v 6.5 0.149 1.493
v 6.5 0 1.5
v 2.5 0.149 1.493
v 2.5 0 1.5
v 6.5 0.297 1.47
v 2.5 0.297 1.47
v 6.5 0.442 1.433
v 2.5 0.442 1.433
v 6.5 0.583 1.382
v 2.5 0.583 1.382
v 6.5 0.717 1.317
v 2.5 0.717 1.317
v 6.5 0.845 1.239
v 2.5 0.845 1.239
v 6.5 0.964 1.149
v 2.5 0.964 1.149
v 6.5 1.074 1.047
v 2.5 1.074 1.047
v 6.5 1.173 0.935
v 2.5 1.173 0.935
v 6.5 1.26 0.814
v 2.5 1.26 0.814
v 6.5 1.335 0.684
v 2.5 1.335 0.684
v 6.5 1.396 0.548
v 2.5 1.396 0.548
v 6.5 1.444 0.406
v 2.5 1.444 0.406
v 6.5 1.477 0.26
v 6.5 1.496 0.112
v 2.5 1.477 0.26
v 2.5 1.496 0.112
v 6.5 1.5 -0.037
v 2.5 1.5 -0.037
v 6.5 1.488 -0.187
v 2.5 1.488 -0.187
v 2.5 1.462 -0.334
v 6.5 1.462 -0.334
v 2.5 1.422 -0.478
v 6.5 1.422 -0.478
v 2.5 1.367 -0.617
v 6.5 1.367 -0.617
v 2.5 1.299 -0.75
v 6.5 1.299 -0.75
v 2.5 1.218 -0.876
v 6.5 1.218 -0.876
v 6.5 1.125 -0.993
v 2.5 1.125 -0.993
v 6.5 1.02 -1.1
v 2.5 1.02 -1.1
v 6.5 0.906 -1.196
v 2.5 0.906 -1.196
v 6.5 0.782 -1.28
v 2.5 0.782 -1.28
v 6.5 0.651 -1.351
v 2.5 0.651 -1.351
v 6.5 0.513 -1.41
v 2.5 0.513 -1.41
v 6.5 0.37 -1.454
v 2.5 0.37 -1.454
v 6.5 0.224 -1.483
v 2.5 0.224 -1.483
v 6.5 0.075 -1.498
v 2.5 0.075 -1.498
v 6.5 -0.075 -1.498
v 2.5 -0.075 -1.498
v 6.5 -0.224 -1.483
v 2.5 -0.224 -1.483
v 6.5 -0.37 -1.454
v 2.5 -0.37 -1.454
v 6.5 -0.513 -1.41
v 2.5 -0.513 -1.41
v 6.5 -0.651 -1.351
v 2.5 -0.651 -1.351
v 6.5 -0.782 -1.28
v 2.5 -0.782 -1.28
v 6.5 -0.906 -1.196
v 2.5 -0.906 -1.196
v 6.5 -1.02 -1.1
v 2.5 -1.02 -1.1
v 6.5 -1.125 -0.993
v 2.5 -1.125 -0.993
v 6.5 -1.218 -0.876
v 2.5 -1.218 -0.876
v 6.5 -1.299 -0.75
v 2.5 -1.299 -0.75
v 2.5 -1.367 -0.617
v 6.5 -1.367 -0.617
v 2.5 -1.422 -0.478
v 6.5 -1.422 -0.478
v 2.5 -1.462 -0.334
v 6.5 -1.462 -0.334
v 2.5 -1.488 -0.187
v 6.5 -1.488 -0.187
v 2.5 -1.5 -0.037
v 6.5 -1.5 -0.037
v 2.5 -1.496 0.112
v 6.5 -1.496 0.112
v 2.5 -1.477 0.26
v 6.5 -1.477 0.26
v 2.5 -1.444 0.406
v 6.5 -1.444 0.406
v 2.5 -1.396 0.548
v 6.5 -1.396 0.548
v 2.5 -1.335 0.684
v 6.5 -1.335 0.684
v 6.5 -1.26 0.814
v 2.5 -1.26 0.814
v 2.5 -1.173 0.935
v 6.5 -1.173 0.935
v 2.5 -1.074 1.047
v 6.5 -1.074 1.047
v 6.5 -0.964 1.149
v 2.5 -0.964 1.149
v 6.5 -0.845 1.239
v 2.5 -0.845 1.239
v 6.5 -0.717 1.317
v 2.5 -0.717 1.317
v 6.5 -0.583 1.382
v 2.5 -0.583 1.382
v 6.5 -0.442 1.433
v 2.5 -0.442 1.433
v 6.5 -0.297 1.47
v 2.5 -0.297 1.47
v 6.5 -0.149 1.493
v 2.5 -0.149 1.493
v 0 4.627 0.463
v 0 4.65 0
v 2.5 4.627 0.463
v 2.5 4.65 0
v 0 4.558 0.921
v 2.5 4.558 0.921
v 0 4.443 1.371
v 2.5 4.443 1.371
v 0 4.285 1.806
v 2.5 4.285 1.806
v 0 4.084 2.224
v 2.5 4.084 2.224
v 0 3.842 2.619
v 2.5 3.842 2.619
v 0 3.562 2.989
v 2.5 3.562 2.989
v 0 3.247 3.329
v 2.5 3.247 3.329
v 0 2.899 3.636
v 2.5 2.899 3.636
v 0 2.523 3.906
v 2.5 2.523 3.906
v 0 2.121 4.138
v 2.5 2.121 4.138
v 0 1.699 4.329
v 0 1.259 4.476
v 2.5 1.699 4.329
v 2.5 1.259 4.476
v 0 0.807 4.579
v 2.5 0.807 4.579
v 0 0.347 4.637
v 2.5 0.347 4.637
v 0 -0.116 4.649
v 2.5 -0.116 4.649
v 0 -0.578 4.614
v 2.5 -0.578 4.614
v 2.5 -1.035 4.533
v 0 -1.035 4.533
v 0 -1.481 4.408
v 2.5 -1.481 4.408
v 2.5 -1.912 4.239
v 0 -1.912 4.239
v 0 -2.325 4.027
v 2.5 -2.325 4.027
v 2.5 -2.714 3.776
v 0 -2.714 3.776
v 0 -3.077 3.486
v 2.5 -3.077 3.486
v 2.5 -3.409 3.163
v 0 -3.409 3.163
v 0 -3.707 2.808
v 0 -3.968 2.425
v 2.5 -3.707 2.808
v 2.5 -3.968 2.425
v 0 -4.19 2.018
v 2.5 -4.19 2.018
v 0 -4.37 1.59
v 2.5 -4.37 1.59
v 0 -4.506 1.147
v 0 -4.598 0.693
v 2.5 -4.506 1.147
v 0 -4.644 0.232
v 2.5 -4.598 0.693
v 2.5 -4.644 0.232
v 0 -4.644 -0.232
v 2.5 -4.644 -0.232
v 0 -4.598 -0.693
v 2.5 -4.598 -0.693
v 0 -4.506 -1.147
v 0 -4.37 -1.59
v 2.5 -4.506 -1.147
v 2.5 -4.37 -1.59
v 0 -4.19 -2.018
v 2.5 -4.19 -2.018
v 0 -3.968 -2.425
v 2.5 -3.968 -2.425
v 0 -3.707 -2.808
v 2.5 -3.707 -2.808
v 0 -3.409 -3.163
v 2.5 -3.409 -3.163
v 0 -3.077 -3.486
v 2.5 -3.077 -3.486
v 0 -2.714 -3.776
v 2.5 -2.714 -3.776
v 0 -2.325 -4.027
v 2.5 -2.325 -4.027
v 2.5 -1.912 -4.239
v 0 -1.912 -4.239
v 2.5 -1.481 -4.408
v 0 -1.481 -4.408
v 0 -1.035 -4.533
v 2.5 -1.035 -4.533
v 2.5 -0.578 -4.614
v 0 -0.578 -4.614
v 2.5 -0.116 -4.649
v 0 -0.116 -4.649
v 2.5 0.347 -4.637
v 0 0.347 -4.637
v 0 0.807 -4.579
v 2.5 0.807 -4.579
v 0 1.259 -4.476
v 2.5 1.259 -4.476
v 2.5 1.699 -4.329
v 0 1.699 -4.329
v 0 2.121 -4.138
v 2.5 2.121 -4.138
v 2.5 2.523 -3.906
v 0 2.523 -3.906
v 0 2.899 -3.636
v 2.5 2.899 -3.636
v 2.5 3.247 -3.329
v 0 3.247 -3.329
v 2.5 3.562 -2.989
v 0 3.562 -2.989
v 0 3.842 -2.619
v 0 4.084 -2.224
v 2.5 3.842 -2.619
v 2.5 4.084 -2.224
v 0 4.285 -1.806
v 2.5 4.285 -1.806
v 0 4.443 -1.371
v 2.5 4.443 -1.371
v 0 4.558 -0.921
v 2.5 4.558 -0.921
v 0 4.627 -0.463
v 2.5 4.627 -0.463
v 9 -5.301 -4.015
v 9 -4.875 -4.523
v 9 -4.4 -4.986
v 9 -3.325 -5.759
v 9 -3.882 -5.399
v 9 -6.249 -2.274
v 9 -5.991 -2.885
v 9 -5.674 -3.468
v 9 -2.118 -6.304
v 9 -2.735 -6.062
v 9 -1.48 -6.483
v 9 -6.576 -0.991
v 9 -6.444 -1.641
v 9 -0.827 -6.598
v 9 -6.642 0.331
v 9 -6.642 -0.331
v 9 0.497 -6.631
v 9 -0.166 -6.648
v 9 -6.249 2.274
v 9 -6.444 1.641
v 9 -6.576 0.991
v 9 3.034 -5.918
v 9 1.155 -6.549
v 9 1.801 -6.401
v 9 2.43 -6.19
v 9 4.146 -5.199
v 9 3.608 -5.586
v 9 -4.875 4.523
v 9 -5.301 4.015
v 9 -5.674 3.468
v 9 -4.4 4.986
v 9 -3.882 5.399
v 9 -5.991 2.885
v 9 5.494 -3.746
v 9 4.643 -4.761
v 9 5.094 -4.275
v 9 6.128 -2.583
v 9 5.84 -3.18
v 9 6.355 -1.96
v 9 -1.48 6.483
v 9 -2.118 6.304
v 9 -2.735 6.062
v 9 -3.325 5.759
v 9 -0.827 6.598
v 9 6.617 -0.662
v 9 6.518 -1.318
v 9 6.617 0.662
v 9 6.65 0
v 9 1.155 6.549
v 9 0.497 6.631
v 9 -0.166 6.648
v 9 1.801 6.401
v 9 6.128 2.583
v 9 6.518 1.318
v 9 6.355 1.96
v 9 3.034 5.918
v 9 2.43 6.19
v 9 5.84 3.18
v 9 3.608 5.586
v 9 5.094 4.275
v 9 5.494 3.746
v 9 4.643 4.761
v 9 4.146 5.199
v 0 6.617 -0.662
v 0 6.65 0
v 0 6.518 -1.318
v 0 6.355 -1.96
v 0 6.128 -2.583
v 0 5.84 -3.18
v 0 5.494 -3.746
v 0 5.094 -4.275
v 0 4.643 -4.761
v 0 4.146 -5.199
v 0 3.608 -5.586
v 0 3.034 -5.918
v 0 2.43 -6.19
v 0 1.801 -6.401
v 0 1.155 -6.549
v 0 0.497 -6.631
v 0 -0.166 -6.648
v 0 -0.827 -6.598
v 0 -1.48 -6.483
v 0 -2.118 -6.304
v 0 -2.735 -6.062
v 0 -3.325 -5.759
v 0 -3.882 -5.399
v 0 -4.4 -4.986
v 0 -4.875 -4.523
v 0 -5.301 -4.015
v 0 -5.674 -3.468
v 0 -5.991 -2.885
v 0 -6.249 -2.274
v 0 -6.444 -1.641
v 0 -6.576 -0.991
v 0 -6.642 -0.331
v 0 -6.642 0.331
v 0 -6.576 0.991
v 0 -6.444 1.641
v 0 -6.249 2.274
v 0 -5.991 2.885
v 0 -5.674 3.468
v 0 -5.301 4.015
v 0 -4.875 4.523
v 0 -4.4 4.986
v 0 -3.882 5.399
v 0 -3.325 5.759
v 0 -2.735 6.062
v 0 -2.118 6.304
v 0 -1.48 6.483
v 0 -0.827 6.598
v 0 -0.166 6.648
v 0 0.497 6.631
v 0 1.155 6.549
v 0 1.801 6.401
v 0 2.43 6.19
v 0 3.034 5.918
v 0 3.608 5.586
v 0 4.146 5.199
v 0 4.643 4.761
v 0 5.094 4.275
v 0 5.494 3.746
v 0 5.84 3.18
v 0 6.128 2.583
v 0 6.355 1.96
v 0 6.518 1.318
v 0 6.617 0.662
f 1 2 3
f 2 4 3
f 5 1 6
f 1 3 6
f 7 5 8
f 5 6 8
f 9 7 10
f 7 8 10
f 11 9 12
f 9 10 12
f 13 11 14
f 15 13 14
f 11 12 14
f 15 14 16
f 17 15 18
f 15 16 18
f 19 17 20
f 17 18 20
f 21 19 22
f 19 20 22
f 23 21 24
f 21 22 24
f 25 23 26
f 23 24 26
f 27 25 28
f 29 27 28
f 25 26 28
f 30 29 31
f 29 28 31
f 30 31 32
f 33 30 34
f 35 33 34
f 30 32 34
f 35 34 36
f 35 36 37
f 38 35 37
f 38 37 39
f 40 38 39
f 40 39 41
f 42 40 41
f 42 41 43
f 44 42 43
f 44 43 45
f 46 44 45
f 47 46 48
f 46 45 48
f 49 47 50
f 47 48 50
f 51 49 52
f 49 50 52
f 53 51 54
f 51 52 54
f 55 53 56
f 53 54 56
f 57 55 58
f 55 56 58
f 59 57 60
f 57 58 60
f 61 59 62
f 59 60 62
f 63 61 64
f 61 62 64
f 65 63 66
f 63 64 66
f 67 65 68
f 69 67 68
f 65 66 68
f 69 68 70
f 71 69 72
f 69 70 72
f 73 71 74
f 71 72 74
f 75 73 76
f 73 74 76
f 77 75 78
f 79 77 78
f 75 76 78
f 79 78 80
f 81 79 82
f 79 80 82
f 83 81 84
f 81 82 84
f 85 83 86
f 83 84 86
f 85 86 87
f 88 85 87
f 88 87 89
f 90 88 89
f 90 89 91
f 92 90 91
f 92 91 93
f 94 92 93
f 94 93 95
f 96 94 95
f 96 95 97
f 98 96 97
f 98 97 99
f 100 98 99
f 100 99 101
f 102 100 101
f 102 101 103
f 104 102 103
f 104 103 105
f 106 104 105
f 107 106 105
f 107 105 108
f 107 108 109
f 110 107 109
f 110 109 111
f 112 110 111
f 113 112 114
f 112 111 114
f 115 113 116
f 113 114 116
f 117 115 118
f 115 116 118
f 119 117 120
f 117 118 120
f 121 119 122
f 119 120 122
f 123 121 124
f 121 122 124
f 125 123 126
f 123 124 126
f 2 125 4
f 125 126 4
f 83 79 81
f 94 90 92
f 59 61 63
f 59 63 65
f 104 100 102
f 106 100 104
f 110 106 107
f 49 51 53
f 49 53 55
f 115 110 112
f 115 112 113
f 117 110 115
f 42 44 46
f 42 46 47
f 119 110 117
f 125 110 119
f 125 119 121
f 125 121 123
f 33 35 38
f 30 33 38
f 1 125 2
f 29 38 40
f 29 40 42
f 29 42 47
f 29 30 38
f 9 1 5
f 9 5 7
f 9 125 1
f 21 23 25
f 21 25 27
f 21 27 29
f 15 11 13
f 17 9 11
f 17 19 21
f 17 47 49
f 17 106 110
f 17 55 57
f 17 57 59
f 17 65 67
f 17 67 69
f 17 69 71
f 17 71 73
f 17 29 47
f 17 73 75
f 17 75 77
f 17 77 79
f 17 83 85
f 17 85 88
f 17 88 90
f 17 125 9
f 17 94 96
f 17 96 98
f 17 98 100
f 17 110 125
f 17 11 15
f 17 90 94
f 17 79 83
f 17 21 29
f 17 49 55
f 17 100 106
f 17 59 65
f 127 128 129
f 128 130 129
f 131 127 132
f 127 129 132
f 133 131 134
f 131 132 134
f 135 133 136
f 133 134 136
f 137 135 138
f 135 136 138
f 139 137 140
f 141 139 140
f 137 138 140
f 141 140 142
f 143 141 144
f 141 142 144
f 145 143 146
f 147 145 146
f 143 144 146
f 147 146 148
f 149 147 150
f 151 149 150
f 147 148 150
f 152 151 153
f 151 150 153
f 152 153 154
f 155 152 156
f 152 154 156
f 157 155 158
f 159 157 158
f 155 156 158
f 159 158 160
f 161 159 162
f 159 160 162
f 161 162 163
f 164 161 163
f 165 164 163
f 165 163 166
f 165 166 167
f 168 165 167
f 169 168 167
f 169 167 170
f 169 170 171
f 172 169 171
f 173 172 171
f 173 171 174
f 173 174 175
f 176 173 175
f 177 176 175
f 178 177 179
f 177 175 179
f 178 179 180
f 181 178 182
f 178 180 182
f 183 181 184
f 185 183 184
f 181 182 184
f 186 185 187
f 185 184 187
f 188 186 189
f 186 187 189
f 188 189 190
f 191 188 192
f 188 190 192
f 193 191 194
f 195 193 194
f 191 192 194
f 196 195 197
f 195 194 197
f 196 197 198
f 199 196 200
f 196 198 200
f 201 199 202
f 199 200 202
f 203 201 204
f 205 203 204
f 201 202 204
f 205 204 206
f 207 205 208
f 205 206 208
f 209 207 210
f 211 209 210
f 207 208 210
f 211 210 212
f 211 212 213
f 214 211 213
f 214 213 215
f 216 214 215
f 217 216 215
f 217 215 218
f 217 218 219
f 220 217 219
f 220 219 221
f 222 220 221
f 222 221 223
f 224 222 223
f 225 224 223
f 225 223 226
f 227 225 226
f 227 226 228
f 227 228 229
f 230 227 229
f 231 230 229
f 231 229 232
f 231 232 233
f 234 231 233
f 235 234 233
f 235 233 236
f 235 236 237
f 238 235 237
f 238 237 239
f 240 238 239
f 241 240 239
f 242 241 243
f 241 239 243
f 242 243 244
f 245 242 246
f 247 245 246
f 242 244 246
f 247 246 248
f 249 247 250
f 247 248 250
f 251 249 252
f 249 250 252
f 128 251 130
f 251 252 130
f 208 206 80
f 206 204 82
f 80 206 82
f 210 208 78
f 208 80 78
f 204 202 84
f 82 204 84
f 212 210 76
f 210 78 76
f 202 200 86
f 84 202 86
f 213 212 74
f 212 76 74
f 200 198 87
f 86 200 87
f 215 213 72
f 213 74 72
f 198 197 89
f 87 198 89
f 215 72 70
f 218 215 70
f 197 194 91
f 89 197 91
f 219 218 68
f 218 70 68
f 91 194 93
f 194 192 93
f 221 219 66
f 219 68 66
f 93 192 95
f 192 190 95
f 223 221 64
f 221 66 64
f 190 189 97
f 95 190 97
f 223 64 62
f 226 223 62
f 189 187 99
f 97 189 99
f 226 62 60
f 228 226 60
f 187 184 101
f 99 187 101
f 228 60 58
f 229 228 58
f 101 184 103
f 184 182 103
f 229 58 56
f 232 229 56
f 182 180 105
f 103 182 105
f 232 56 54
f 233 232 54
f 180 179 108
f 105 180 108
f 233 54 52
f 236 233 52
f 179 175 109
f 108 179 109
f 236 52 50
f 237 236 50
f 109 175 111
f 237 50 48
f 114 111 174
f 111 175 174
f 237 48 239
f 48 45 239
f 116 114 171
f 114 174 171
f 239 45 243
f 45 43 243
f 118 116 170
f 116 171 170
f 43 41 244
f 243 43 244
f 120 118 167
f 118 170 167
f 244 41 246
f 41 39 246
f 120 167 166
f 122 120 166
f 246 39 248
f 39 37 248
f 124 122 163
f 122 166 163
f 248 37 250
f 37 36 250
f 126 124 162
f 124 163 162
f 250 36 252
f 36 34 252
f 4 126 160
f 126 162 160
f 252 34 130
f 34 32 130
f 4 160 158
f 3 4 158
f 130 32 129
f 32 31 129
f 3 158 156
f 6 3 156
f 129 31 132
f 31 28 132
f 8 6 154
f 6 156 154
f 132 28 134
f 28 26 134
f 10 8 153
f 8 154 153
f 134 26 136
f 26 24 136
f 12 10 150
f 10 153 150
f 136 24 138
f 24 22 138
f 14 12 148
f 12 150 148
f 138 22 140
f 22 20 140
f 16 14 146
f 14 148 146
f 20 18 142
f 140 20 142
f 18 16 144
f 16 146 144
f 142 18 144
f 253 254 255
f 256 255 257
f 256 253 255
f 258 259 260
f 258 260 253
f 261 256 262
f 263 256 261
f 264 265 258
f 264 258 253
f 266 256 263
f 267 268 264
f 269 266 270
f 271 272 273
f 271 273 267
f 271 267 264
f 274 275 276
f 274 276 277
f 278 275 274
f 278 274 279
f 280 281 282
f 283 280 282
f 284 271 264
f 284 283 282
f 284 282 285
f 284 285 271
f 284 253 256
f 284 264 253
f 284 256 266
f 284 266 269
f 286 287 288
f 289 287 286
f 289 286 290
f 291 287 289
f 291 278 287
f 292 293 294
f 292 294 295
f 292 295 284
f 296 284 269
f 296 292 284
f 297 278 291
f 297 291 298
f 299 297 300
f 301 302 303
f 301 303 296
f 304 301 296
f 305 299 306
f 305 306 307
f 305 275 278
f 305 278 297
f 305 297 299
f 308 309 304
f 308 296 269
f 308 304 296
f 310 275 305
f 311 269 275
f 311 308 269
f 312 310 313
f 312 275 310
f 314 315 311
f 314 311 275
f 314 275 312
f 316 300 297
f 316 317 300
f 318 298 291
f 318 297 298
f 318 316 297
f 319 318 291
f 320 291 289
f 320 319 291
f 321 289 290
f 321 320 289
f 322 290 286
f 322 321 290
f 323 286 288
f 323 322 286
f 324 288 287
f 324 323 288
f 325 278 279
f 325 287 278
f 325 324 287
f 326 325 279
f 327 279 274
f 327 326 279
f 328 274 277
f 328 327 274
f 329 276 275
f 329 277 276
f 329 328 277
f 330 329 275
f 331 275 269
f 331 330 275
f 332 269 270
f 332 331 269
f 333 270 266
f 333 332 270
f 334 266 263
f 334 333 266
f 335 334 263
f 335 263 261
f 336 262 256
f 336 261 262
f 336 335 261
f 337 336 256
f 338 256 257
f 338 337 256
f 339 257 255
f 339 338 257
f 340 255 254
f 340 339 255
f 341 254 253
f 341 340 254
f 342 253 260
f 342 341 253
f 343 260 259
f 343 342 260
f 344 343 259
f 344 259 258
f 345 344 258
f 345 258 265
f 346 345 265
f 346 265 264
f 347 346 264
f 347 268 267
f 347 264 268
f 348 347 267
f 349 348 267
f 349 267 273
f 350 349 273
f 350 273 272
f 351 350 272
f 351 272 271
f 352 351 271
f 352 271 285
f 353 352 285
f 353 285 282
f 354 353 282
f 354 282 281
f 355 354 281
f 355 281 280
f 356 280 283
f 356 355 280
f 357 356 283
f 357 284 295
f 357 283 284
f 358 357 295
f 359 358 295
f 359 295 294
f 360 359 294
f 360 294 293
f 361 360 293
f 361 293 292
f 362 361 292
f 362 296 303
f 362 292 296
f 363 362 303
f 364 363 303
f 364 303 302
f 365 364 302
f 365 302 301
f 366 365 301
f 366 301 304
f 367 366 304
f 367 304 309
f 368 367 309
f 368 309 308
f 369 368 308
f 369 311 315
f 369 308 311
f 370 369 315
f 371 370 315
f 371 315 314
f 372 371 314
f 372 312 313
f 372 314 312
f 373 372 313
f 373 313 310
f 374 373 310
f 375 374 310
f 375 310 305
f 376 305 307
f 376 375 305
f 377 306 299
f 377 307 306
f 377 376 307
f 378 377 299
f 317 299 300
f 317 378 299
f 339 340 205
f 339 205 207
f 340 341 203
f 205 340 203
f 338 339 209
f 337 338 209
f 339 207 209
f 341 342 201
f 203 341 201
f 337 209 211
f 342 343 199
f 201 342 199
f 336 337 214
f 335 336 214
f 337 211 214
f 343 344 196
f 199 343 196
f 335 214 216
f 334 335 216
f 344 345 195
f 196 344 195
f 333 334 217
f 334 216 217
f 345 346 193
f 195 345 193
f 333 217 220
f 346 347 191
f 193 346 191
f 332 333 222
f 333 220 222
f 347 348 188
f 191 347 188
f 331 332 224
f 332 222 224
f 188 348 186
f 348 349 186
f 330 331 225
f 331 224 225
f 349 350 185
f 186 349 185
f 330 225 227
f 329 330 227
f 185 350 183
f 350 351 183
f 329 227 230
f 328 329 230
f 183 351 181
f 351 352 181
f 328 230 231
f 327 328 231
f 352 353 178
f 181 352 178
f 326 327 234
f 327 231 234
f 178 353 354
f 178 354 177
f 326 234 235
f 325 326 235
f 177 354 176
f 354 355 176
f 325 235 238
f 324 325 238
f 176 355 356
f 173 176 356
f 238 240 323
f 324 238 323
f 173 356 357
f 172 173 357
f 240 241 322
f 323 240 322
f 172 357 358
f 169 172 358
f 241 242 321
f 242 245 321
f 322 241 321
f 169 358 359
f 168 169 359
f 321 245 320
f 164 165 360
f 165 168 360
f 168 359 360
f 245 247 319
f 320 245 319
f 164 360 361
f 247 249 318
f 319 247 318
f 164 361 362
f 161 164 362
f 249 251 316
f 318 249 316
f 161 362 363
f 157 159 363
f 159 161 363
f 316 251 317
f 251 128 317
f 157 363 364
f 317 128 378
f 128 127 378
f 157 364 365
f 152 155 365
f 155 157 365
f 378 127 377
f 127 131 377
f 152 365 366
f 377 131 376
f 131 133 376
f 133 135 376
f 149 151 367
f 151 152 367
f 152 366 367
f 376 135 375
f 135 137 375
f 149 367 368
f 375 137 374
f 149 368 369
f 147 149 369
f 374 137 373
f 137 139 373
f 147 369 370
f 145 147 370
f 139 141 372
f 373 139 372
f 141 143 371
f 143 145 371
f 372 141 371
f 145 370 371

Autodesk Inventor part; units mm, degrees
ref_plane "YZ Plane" through (0, 0, 0) normal (1, 0, 0) x (0, 1, 0)
ref_plane "XZ Plane" through (0, 0, 0) normal (0, 1, 0) x (-1, 0, 0)
ref_plane "XY Plane" through (0, 0, 0) normal (0, 0, 1) x (1, 0, 0)
sketch "Esboço1" plane through (0, 0, 0) normal (0, 0, 1) x (1, 0, 0)
  line L0 (0, 0) -> (9, 0)
  line L1 (9, 0) -> (9, 6.65)
  line L2 (9, 6.65) -> (0, 6.65)
  line L3 (0, 6.65) -> (0, 4.65)
  line L4 (0, 4.65) -> (2.5, 4.65)
  line L5 (2.5, 4.65) -> (2.5, 0)
  dimension "d0" = 9
  dimension "d1" = 6.65
  dimension "d2" = 2
  dimension "d3" = 2.5
revolve "Revolução1" add sketch "Esboço1" angle 360 about axis through (0, 0, 0) along (1, 0, 0)
sketch "Esboço2" plane through (9, 0, 0) normal (1, 0, 0) x (0, 0, -1)
  circle A0 centre (0, 0) radius 2
  dimension "d5" = 4
extrude "Extrusão1" add sketch "Esboço2" along normal blind 1.5
sketch "Esboço3" plane through (2.5, 0, 0) normal (-1, 0, 0) x (0, 0, 1)
  circle A0 centre (0, 0) radius 1.5
  dimension "d8" = 3
extrude "Extrusão2" cut sketch "Esboço3" against normal blind 4
sketch "Esboço4" plane through (0, 0, 0) normal (-1, 0, 0) x (0, 0, 1)
  point P0 (0, 0)
sketch "Esboço5" plane through (9, 0, 0) normal (1, 0, 0) x (0, 0, -1)
  point P0 (0, 0)
sketch "Esboço6" plane through (10.5, 0, 0) normal (1, 0, 0) x (0, 0, -1)
  circle A0 centre (0, 0) radius 2 projected
  circle A1 centre (0, 0) radius 1
  dimension "d11" = 2
extrude "Extrusão3" cut sketch "Esboço6" against normal blind 1.06 contours A1
sketch "Esboço7" plane through (10.5, 0, 0) normal (1, 0, 0) x (0, 0, -1)
  circle A0 centre (0, 0) radius 2
extrude "Extrusão4" cut sketch "Esboço7" against normal blind 1.5
properties part number "roda sup"
